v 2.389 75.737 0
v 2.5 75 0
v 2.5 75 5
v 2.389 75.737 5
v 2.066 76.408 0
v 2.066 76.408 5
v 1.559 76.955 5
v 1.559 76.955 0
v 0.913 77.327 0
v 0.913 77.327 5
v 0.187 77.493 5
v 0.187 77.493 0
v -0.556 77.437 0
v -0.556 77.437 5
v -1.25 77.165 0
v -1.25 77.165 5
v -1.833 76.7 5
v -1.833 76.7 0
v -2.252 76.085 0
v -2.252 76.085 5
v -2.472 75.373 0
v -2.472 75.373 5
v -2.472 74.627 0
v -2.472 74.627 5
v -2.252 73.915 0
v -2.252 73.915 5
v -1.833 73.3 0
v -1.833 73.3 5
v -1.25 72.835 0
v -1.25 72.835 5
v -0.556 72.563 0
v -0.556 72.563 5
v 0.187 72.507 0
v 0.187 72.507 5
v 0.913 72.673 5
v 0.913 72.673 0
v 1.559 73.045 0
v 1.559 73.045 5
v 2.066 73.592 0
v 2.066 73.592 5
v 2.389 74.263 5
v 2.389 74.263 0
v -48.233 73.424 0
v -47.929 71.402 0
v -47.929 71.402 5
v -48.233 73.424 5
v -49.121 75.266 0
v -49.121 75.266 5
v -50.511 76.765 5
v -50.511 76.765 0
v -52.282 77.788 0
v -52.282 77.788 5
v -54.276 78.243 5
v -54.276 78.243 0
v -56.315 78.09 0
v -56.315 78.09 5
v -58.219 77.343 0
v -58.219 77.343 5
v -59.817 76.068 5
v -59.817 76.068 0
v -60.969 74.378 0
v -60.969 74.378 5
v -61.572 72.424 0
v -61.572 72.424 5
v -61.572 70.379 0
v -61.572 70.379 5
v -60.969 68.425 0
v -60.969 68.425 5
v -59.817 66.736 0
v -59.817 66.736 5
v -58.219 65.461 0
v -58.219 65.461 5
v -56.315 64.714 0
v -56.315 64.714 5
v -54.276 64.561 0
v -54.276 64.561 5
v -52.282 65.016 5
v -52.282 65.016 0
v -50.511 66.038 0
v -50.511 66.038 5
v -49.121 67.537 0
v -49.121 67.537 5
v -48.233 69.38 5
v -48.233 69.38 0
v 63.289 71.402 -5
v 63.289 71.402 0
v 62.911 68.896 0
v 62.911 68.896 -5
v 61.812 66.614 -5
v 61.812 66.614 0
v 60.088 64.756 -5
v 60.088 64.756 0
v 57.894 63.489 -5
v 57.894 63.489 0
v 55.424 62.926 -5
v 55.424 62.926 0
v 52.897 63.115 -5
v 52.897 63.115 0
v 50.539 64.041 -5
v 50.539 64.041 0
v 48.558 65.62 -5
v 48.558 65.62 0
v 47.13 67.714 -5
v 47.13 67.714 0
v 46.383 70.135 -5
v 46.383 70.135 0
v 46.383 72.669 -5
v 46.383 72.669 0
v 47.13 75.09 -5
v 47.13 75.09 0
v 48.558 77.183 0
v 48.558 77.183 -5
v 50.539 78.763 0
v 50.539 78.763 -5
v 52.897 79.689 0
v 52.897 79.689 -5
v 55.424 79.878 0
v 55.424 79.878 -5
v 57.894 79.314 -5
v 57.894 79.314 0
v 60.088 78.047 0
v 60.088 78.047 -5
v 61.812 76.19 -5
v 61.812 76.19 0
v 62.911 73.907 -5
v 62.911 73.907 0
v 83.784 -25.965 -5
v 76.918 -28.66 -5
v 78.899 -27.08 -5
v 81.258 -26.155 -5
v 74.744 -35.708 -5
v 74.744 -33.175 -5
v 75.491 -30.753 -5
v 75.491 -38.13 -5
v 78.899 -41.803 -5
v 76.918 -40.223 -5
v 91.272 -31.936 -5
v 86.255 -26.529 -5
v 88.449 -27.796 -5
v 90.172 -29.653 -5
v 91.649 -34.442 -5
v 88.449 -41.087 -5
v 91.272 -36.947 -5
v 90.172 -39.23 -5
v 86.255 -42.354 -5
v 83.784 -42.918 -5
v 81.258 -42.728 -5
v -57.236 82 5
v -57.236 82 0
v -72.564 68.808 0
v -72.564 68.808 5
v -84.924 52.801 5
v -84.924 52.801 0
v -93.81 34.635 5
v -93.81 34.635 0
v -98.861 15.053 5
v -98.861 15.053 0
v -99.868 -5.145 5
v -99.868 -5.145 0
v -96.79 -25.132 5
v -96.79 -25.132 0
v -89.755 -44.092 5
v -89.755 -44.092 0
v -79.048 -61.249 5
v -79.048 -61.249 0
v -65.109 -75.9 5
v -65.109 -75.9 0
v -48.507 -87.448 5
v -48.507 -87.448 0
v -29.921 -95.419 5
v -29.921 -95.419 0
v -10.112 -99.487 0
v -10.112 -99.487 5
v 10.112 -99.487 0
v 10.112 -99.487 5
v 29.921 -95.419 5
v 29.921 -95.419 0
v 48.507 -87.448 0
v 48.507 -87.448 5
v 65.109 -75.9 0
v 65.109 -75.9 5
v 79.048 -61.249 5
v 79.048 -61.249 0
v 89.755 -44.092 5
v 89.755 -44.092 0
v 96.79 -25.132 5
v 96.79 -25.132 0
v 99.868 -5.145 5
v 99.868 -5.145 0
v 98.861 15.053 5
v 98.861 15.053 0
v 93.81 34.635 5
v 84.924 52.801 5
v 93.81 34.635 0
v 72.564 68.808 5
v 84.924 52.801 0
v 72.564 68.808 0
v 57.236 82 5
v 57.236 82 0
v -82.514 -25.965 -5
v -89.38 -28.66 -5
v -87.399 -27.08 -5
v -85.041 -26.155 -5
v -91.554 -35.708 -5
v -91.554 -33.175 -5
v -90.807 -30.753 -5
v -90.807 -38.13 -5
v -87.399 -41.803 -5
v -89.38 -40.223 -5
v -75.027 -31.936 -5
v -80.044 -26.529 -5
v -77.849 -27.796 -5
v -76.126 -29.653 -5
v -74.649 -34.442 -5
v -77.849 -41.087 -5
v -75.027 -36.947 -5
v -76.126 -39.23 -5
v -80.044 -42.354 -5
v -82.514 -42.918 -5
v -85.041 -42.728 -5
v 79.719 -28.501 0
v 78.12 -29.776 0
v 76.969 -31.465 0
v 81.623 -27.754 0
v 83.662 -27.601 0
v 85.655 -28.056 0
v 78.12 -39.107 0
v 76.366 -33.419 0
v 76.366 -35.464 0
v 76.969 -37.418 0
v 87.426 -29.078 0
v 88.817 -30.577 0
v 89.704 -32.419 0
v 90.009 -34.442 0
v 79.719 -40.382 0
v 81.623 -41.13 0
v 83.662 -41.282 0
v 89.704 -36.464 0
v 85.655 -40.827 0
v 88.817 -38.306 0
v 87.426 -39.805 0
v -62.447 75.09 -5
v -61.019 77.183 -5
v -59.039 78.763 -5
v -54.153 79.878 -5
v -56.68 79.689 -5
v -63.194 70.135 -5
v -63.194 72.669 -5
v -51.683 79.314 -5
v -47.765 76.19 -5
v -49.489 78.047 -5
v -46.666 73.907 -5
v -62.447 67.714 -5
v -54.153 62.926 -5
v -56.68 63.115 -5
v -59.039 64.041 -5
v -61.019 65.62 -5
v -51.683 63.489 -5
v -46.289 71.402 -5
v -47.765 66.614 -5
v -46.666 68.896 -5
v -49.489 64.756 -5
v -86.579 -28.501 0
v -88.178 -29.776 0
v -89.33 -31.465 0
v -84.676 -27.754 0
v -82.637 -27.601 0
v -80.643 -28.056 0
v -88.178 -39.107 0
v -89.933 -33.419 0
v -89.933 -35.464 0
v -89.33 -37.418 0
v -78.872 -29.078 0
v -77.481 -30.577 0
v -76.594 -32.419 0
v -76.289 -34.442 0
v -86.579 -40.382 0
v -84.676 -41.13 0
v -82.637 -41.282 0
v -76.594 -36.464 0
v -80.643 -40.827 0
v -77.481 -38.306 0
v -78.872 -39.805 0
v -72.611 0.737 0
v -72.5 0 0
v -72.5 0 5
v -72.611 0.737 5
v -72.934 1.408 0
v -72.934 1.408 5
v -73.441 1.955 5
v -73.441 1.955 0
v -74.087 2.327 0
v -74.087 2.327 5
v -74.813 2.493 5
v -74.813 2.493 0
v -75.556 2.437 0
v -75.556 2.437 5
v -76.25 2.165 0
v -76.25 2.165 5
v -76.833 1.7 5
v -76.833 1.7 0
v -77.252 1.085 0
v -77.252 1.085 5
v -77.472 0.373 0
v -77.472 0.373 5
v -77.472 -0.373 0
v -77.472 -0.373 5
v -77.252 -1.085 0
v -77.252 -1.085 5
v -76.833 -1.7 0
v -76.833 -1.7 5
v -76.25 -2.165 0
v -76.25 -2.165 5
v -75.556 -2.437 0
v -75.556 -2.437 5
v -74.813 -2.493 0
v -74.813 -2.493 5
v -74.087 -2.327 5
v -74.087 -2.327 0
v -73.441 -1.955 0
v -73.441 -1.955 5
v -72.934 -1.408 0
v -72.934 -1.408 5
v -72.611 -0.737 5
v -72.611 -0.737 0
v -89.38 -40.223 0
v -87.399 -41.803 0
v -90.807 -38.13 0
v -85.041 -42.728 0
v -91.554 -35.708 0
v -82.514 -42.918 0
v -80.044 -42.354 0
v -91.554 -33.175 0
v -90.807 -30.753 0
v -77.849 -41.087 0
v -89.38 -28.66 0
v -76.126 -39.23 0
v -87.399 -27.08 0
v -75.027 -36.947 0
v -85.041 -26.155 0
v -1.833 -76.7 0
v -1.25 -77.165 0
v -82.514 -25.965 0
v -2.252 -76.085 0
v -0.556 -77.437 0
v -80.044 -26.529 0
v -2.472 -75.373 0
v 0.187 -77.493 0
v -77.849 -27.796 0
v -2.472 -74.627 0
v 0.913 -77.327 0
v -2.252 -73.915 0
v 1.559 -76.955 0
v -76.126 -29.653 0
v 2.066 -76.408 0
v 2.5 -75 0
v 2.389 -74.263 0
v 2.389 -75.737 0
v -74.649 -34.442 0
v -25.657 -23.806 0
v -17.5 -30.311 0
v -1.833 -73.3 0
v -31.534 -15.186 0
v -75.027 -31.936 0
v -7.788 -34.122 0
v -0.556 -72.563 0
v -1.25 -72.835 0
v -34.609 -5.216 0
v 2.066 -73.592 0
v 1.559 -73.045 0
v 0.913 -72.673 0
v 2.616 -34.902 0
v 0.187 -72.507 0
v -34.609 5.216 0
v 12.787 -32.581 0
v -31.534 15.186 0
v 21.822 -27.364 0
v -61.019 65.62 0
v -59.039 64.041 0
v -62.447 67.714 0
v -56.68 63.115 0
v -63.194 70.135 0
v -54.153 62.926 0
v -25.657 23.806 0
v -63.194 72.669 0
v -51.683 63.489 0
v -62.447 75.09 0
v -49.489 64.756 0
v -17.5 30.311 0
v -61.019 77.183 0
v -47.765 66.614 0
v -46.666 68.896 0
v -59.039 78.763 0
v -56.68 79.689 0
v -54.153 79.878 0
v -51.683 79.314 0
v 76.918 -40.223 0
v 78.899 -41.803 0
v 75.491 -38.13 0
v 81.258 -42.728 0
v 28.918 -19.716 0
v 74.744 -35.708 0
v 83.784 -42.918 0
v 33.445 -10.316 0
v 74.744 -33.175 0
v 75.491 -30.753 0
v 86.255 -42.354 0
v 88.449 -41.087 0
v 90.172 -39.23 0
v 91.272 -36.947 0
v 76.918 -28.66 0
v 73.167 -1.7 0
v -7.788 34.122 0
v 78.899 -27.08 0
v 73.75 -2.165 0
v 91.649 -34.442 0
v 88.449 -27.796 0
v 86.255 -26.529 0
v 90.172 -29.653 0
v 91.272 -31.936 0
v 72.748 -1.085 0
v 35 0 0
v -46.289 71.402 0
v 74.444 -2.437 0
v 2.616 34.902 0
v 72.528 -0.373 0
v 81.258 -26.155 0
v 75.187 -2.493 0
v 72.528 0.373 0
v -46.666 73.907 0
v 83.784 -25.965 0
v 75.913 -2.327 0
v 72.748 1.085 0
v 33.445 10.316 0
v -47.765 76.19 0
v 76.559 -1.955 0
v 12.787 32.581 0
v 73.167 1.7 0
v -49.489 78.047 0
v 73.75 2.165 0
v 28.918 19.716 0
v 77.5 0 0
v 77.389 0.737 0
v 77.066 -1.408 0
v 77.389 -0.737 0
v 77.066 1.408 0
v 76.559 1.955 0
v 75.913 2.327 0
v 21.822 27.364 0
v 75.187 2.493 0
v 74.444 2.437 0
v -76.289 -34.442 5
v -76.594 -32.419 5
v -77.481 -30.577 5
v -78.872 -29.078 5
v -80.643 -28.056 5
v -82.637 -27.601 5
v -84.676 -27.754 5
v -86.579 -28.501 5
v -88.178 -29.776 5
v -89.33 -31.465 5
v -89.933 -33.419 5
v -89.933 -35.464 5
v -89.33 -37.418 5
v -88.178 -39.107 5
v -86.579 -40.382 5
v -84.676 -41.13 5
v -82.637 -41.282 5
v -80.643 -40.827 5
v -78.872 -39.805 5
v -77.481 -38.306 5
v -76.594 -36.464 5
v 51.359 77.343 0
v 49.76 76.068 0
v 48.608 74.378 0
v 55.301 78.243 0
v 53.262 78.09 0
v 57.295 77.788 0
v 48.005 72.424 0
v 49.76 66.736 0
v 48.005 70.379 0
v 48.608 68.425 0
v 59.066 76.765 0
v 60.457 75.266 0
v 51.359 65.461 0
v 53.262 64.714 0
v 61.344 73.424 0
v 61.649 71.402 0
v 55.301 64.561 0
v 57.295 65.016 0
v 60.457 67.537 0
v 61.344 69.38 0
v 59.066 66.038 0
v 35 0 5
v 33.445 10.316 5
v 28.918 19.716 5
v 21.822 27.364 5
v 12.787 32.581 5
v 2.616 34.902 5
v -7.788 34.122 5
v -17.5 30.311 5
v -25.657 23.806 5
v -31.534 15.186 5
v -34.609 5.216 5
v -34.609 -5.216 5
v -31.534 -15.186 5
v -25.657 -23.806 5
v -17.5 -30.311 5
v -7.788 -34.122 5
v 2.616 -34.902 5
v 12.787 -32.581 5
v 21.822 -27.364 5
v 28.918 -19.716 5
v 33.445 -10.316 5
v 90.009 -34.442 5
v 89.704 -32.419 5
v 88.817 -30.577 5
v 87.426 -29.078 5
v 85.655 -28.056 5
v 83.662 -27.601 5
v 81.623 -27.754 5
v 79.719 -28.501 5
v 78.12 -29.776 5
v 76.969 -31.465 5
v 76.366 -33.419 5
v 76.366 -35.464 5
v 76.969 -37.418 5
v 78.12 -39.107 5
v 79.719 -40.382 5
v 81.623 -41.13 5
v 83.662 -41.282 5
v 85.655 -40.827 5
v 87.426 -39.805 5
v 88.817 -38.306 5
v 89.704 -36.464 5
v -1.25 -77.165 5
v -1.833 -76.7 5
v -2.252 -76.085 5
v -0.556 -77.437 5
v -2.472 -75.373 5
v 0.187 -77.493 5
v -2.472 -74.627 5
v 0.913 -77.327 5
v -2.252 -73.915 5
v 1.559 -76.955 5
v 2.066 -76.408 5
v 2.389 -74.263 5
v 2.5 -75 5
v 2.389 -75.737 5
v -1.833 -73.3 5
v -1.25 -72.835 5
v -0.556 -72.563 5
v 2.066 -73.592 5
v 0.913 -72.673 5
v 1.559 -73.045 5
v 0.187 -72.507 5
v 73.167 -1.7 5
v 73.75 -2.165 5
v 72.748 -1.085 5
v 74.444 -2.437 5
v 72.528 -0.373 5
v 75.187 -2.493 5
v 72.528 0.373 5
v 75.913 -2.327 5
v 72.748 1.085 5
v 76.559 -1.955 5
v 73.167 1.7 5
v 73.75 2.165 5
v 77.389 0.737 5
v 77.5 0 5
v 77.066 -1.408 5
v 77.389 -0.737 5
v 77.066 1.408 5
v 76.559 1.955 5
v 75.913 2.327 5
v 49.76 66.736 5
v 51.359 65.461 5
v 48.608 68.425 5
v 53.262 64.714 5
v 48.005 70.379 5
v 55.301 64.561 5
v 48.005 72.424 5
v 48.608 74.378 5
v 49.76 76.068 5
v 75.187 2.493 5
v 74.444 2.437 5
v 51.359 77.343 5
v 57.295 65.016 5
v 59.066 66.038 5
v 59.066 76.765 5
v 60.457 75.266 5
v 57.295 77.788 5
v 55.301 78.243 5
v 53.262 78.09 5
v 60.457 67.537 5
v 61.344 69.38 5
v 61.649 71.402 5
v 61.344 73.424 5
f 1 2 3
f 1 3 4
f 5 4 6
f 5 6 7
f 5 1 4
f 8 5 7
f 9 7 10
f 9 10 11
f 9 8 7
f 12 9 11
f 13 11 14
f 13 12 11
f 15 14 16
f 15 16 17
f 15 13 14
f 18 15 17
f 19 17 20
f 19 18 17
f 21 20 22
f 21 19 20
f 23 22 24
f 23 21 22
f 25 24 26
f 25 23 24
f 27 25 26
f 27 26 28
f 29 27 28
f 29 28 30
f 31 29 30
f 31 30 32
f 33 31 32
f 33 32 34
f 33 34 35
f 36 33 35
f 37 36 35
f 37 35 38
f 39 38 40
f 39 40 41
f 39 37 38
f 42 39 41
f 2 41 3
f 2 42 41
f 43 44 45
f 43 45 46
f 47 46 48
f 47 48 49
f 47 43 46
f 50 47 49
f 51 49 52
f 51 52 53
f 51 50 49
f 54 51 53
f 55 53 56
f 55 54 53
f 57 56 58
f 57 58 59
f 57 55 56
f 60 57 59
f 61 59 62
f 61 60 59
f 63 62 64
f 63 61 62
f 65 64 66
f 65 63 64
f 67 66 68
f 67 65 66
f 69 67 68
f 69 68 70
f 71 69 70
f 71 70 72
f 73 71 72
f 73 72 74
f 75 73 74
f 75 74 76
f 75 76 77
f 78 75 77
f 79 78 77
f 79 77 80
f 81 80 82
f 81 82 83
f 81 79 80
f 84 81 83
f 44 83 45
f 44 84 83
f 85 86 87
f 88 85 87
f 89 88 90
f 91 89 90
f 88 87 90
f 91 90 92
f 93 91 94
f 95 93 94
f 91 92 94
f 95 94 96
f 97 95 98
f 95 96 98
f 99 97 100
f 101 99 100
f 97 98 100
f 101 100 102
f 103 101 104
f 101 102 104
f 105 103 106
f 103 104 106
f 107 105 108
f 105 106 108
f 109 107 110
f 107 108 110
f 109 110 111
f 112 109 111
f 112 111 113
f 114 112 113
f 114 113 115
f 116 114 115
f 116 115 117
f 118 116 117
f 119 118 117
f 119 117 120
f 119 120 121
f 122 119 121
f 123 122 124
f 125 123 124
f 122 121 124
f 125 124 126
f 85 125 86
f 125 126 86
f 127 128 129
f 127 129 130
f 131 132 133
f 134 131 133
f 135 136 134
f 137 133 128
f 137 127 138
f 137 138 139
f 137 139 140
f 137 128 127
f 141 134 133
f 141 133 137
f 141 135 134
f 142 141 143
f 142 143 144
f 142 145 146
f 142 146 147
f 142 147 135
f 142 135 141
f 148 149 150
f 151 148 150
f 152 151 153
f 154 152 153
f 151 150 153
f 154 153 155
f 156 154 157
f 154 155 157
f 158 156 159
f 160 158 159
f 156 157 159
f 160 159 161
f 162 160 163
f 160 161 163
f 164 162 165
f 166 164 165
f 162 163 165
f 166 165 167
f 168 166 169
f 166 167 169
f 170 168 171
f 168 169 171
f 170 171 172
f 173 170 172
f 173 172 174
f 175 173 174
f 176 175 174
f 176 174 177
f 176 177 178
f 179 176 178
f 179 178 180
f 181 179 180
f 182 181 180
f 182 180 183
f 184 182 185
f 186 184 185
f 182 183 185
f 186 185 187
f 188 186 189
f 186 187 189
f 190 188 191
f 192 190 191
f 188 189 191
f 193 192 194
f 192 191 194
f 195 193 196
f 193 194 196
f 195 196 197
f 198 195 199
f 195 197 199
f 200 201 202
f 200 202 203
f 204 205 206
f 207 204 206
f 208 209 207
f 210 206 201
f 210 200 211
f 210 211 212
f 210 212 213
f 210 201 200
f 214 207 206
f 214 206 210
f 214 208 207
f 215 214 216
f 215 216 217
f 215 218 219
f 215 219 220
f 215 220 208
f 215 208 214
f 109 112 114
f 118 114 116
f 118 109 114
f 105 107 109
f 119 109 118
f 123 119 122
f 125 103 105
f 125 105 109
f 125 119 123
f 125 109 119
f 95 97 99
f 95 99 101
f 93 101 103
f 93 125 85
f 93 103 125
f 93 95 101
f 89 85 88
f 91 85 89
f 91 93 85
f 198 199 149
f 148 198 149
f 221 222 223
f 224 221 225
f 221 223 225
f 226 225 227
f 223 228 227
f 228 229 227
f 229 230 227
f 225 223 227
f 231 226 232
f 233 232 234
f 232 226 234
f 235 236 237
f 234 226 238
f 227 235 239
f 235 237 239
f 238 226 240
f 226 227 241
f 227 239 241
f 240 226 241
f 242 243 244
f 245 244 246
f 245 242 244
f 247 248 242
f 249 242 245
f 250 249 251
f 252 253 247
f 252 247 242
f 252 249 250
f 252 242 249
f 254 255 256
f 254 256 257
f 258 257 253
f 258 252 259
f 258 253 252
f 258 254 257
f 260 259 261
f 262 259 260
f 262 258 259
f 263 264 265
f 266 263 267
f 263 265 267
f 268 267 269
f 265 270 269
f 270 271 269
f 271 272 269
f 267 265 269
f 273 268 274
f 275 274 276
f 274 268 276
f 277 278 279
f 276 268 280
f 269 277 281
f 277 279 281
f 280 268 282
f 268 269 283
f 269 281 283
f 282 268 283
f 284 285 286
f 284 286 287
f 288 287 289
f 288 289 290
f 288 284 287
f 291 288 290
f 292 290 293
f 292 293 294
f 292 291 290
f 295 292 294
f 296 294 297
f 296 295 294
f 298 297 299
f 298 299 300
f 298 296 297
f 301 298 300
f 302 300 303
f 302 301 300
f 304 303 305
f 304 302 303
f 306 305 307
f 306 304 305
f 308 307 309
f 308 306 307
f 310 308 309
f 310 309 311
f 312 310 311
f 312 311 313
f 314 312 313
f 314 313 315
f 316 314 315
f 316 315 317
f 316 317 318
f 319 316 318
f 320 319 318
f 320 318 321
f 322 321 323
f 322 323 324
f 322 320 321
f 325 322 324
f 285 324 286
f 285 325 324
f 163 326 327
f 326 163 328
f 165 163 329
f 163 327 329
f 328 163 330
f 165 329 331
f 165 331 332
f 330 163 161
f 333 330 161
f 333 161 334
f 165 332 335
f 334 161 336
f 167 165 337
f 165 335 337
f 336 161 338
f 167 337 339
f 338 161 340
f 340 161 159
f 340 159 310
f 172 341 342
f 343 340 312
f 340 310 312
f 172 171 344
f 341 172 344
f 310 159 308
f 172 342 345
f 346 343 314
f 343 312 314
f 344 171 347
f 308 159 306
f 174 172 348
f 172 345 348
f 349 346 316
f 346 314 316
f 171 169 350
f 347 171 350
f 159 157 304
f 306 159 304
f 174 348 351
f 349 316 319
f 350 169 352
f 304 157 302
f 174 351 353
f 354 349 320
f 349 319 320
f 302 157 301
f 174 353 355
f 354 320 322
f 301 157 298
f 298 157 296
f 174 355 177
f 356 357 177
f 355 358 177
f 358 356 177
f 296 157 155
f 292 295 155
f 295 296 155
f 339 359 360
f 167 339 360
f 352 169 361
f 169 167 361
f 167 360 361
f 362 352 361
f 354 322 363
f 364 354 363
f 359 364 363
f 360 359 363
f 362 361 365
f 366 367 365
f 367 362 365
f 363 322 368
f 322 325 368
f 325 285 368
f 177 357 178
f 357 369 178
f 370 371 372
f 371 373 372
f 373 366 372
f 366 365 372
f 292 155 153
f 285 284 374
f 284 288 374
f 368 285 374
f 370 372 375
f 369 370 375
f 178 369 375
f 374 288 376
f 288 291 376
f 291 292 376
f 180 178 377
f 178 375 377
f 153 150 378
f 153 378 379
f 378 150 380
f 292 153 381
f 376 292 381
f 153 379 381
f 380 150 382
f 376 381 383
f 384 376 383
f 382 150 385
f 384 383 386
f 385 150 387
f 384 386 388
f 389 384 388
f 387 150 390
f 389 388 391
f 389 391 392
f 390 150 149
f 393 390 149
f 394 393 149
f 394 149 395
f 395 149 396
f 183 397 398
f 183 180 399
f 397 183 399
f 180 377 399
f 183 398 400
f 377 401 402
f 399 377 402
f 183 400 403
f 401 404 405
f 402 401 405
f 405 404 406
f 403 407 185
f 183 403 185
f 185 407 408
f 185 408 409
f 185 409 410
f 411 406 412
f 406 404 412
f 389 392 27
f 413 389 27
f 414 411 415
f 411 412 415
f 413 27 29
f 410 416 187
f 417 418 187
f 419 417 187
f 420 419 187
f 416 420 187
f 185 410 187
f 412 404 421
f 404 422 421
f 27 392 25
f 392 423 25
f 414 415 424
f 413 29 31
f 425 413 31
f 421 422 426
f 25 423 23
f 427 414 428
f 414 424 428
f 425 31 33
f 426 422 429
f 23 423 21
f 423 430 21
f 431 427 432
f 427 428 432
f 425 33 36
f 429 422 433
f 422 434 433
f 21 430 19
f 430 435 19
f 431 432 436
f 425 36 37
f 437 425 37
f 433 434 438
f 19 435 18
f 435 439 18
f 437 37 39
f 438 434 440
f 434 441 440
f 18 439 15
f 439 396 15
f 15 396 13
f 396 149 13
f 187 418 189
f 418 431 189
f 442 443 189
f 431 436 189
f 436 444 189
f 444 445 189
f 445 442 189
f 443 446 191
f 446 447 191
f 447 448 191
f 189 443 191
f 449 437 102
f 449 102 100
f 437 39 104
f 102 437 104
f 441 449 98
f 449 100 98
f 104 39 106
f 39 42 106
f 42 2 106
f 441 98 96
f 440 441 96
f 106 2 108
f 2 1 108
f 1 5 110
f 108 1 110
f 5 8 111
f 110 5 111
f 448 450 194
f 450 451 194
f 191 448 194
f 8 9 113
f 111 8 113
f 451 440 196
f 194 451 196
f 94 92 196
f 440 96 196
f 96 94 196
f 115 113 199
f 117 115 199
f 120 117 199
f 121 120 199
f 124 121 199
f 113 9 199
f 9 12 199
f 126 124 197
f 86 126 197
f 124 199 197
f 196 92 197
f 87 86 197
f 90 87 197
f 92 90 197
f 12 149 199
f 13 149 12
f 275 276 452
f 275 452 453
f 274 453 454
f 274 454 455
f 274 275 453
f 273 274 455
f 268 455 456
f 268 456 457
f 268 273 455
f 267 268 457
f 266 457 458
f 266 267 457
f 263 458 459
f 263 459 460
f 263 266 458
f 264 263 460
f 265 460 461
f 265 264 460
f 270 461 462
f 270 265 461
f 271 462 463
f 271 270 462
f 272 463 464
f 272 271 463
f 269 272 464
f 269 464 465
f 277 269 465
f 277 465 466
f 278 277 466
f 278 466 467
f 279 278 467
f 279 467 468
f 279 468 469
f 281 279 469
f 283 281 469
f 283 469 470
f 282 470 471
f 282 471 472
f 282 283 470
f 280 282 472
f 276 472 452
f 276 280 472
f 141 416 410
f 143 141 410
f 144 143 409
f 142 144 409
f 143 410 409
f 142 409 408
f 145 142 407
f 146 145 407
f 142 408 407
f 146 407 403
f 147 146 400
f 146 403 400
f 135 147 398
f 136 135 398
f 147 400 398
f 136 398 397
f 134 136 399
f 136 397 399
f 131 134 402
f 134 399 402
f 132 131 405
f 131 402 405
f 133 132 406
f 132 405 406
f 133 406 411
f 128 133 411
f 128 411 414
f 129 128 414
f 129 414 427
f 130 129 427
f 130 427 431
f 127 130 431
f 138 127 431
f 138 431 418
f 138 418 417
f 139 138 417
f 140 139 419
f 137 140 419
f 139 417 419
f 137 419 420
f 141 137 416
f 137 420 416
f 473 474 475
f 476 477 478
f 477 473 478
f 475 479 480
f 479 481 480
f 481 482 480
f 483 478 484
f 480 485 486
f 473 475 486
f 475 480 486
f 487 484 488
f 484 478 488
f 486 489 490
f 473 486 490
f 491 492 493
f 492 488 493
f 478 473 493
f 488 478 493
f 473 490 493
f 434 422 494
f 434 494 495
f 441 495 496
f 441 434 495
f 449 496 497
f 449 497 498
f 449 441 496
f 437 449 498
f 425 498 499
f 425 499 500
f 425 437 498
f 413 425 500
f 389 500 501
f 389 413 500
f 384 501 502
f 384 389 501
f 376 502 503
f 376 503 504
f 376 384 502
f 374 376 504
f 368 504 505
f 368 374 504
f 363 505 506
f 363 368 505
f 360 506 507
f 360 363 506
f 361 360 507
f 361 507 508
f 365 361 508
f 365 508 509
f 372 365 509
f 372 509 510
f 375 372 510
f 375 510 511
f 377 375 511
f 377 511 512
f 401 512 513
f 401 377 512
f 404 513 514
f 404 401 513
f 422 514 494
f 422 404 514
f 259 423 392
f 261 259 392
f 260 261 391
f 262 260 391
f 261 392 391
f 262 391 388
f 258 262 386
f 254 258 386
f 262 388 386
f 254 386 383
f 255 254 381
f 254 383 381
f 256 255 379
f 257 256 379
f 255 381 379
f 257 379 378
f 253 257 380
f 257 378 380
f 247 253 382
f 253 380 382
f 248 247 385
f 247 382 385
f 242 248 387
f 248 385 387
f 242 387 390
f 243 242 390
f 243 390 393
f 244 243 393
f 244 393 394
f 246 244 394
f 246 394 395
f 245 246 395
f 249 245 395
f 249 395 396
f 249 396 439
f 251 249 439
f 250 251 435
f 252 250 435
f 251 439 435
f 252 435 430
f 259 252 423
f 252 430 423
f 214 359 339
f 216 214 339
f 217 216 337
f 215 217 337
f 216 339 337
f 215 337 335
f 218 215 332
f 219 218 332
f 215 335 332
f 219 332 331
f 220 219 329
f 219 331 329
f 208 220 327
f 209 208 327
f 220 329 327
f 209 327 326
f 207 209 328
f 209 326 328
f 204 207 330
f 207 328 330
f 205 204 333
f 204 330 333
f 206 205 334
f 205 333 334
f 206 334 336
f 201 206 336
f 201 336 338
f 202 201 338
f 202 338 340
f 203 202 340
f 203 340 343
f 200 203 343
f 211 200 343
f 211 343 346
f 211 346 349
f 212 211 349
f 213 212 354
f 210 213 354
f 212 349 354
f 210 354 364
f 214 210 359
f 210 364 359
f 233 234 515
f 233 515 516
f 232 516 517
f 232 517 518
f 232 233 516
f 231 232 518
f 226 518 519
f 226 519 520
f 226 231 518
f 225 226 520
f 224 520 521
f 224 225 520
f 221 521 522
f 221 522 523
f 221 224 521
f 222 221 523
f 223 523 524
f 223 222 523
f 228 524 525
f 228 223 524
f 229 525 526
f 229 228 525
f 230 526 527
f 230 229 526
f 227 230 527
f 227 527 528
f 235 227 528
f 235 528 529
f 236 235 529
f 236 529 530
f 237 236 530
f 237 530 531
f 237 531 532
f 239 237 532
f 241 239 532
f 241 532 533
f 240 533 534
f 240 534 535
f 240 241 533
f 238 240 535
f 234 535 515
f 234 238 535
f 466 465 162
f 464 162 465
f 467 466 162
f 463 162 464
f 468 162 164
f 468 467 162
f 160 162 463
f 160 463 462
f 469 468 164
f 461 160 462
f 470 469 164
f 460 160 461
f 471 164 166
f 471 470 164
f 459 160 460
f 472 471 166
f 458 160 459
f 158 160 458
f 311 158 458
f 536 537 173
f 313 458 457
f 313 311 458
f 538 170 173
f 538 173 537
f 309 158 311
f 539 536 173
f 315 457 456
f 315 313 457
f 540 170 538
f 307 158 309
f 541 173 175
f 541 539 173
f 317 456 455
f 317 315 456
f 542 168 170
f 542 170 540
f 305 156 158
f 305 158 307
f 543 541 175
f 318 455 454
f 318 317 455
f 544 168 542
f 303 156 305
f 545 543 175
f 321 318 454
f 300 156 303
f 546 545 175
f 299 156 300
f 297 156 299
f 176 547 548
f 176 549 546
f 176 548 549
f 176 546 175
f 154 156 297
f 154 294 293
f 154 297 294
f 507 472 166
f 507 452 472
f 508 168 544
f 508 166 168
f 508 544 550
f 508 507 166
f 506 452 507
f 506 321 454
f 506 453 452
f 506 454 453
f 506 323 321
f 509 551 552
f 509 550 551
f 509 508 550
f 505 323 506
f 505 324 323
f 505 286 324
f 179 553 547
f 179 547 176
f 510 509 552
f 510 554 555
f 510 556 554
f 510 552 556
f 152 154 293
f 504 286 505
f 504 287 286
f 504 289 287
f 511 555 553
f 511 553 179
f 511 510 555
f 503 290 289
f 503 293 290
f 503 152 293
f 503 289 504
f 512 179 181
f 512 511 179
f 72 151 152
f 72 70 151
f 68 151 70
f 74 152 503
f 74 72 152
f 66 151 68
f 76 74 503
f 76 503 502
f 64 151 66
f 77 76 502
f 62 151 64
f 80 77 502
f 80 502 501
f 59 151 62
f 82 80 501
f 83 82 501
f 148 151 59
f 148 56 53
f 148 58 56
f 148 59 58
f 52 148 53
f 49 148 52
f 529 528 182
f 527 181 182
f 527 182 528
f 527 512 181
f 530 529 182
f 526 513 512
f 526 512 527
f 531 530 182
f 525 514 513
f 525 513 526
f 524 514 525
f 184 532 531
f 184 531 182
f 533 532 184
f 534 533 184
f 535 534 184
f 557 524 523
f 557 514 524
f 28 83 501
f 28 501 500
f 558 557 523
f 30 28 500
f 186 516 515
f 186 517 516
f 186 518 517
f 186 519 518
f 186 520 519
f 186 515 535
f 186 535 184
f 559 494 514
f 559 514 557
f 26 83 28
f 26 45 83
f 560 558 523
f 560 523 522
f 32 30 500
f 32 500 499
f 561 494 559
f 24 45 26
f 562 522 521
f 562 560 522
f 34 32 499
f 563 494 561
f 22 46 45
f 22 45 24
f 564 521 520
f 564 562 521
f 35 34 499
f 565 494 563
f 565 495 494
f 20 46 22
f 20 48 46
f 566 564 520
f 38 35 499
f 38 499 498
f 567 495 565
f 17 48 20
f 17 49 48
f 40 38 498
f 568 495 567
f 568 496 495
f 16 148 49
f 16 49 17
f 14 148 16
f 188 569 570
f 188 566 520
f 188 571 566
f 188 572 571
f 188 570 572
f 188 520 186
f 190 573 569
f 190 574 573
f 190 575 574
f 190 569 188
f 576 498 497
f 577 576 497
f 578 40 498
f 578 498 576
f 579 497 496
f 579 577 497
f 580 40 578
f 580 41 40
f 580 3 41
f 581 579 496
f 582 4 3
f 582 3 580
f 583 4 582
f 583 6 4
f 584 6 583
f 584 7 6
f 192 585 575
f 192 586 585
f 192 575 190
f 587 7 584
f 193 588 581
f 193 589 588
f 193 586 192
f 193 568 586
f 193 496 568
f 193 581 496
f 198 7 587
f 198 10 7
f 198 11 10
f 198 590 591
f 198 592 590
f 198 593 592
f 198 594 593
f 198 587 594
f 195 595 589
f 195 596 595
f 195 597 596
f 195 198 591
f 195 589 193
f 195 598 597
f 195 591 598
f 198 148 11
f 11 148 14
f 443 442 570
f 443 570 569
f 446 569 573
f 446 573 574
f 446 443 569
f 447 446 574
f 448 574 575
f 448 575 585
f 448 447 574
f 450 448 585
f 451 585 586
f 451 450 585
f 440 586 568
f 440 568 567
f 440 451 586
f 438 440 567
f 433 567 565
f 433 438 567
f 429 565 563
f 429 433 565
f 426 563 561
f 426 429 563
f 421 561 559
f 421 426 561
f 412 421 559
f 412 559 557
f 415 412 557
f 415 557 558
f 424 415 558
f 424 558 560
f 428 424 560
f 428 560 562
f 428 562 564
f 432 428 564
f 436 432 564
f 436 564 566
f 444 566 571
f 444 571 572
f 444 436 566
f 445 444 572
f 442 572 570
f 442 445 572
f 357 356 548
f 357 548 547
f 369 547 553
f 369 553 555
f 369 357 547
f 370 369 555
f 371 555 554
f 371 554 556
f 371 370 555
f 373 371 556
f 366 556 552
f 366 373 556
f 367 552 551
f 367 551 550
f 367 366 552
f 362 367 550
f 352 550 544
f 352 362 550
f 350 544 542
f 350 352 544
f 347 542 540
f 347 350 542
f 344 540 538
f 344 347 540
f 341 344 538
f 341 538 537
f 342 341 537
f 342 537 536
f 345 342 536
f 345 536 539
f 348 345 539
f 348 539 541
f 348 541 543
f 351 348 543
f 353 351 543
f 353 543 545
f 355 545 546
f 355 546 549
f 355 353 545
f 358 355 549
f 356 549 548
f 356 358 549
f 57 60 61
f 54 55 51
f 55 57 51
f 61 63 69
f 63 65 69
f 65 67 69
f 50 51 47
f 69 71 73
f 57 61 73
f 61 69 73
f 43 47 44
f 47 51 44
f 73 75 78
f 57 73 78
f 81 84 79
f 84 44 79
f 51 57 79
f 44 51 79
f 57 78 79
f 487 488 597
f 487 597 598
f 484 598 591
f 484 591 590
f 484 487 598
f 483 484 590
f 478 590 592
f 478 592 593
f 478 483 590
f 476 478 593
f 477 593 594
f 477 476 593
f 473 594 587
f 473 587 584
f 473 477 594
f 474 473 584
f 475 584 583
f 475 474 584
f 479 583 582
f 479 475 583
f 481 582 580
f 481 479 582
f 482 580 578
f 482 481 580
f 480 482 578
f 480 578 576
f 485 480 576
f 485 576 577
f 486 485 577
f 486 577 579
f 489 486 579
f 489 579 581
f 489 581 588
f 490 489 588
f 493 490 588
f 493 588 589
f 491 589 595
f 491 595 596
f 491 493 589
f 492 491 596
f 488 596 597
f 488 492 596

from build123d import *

# Parameters (mm, degrees)
F0_R     = 2.5
F0_R_2   = 6.86
F0_R_3   = 35
F1_DEPTH = 5
F2_R     = 8.5
F3_DEPTH = 5


with BuildPart() as f1:
    # F0 (on Top) → F1 (new body)
    with BuildSketch(Plane.XY):
        with BuildLine():
            Line((57.236352, 82), (-57.236352, 82))
            ThreePointArc((-57.236352, 82), (0, -100), (57.236352, 82))
        make_face()
        with Locations((0, -75)):
            Circle(F0_R, mode=Mode.SUBTRACT)
        with Locations((-83.149158, -34.441509)):
            Circle(F0_R_2, mode=Mode.SUBTRACT)
        with Locations((83.149158, -34.441509)):
            Circle(F0_R_2, mode=Mode.SUBTRACT)
        with Locations((-75, 0)):
            Circle(F0_R, mode=Mode.SUBTRACT)
        Circle(F0_R_3, mode=Mode.SUBTRACT)
        with Locations((-54.788529, 71.401801)):
            Circle(F0_R_2, mode=Mode.SUBTRACT)
        with Locations((0, 75)):
            Circle(F0_R, mode=Mode.SUBTRACT)
        with Locations((75, 0)):
            Circle(F0_R, mode=Mode.SUBTRACT)
        with Locations((54.788529, 71.401801)):
            Circle(F0_R_2, mode=Mode.SUBTRACT)
    extrude(amount=F1_DEPTH)

    # F2 (on face) → F3 (join)
    with BuildSketch(Plane(origin=(0, 0, 0), x_dir=(1, 0, 0), z_dir=(0, 0, -1))):
        with Locations((83.149158, 34.441509)):
            Circle(F2_R)
        with Locations((54.788529, -71.401801)):
            Circle(F2_R)
        with Locations((-54.788529, -71.401801)):
            Circle(F2_R)
        with Locations((-83.149158, 34.441509)):
            Circle(F2_R)
    extrude(amount=F3_DEPTH)


solid = f1.part
